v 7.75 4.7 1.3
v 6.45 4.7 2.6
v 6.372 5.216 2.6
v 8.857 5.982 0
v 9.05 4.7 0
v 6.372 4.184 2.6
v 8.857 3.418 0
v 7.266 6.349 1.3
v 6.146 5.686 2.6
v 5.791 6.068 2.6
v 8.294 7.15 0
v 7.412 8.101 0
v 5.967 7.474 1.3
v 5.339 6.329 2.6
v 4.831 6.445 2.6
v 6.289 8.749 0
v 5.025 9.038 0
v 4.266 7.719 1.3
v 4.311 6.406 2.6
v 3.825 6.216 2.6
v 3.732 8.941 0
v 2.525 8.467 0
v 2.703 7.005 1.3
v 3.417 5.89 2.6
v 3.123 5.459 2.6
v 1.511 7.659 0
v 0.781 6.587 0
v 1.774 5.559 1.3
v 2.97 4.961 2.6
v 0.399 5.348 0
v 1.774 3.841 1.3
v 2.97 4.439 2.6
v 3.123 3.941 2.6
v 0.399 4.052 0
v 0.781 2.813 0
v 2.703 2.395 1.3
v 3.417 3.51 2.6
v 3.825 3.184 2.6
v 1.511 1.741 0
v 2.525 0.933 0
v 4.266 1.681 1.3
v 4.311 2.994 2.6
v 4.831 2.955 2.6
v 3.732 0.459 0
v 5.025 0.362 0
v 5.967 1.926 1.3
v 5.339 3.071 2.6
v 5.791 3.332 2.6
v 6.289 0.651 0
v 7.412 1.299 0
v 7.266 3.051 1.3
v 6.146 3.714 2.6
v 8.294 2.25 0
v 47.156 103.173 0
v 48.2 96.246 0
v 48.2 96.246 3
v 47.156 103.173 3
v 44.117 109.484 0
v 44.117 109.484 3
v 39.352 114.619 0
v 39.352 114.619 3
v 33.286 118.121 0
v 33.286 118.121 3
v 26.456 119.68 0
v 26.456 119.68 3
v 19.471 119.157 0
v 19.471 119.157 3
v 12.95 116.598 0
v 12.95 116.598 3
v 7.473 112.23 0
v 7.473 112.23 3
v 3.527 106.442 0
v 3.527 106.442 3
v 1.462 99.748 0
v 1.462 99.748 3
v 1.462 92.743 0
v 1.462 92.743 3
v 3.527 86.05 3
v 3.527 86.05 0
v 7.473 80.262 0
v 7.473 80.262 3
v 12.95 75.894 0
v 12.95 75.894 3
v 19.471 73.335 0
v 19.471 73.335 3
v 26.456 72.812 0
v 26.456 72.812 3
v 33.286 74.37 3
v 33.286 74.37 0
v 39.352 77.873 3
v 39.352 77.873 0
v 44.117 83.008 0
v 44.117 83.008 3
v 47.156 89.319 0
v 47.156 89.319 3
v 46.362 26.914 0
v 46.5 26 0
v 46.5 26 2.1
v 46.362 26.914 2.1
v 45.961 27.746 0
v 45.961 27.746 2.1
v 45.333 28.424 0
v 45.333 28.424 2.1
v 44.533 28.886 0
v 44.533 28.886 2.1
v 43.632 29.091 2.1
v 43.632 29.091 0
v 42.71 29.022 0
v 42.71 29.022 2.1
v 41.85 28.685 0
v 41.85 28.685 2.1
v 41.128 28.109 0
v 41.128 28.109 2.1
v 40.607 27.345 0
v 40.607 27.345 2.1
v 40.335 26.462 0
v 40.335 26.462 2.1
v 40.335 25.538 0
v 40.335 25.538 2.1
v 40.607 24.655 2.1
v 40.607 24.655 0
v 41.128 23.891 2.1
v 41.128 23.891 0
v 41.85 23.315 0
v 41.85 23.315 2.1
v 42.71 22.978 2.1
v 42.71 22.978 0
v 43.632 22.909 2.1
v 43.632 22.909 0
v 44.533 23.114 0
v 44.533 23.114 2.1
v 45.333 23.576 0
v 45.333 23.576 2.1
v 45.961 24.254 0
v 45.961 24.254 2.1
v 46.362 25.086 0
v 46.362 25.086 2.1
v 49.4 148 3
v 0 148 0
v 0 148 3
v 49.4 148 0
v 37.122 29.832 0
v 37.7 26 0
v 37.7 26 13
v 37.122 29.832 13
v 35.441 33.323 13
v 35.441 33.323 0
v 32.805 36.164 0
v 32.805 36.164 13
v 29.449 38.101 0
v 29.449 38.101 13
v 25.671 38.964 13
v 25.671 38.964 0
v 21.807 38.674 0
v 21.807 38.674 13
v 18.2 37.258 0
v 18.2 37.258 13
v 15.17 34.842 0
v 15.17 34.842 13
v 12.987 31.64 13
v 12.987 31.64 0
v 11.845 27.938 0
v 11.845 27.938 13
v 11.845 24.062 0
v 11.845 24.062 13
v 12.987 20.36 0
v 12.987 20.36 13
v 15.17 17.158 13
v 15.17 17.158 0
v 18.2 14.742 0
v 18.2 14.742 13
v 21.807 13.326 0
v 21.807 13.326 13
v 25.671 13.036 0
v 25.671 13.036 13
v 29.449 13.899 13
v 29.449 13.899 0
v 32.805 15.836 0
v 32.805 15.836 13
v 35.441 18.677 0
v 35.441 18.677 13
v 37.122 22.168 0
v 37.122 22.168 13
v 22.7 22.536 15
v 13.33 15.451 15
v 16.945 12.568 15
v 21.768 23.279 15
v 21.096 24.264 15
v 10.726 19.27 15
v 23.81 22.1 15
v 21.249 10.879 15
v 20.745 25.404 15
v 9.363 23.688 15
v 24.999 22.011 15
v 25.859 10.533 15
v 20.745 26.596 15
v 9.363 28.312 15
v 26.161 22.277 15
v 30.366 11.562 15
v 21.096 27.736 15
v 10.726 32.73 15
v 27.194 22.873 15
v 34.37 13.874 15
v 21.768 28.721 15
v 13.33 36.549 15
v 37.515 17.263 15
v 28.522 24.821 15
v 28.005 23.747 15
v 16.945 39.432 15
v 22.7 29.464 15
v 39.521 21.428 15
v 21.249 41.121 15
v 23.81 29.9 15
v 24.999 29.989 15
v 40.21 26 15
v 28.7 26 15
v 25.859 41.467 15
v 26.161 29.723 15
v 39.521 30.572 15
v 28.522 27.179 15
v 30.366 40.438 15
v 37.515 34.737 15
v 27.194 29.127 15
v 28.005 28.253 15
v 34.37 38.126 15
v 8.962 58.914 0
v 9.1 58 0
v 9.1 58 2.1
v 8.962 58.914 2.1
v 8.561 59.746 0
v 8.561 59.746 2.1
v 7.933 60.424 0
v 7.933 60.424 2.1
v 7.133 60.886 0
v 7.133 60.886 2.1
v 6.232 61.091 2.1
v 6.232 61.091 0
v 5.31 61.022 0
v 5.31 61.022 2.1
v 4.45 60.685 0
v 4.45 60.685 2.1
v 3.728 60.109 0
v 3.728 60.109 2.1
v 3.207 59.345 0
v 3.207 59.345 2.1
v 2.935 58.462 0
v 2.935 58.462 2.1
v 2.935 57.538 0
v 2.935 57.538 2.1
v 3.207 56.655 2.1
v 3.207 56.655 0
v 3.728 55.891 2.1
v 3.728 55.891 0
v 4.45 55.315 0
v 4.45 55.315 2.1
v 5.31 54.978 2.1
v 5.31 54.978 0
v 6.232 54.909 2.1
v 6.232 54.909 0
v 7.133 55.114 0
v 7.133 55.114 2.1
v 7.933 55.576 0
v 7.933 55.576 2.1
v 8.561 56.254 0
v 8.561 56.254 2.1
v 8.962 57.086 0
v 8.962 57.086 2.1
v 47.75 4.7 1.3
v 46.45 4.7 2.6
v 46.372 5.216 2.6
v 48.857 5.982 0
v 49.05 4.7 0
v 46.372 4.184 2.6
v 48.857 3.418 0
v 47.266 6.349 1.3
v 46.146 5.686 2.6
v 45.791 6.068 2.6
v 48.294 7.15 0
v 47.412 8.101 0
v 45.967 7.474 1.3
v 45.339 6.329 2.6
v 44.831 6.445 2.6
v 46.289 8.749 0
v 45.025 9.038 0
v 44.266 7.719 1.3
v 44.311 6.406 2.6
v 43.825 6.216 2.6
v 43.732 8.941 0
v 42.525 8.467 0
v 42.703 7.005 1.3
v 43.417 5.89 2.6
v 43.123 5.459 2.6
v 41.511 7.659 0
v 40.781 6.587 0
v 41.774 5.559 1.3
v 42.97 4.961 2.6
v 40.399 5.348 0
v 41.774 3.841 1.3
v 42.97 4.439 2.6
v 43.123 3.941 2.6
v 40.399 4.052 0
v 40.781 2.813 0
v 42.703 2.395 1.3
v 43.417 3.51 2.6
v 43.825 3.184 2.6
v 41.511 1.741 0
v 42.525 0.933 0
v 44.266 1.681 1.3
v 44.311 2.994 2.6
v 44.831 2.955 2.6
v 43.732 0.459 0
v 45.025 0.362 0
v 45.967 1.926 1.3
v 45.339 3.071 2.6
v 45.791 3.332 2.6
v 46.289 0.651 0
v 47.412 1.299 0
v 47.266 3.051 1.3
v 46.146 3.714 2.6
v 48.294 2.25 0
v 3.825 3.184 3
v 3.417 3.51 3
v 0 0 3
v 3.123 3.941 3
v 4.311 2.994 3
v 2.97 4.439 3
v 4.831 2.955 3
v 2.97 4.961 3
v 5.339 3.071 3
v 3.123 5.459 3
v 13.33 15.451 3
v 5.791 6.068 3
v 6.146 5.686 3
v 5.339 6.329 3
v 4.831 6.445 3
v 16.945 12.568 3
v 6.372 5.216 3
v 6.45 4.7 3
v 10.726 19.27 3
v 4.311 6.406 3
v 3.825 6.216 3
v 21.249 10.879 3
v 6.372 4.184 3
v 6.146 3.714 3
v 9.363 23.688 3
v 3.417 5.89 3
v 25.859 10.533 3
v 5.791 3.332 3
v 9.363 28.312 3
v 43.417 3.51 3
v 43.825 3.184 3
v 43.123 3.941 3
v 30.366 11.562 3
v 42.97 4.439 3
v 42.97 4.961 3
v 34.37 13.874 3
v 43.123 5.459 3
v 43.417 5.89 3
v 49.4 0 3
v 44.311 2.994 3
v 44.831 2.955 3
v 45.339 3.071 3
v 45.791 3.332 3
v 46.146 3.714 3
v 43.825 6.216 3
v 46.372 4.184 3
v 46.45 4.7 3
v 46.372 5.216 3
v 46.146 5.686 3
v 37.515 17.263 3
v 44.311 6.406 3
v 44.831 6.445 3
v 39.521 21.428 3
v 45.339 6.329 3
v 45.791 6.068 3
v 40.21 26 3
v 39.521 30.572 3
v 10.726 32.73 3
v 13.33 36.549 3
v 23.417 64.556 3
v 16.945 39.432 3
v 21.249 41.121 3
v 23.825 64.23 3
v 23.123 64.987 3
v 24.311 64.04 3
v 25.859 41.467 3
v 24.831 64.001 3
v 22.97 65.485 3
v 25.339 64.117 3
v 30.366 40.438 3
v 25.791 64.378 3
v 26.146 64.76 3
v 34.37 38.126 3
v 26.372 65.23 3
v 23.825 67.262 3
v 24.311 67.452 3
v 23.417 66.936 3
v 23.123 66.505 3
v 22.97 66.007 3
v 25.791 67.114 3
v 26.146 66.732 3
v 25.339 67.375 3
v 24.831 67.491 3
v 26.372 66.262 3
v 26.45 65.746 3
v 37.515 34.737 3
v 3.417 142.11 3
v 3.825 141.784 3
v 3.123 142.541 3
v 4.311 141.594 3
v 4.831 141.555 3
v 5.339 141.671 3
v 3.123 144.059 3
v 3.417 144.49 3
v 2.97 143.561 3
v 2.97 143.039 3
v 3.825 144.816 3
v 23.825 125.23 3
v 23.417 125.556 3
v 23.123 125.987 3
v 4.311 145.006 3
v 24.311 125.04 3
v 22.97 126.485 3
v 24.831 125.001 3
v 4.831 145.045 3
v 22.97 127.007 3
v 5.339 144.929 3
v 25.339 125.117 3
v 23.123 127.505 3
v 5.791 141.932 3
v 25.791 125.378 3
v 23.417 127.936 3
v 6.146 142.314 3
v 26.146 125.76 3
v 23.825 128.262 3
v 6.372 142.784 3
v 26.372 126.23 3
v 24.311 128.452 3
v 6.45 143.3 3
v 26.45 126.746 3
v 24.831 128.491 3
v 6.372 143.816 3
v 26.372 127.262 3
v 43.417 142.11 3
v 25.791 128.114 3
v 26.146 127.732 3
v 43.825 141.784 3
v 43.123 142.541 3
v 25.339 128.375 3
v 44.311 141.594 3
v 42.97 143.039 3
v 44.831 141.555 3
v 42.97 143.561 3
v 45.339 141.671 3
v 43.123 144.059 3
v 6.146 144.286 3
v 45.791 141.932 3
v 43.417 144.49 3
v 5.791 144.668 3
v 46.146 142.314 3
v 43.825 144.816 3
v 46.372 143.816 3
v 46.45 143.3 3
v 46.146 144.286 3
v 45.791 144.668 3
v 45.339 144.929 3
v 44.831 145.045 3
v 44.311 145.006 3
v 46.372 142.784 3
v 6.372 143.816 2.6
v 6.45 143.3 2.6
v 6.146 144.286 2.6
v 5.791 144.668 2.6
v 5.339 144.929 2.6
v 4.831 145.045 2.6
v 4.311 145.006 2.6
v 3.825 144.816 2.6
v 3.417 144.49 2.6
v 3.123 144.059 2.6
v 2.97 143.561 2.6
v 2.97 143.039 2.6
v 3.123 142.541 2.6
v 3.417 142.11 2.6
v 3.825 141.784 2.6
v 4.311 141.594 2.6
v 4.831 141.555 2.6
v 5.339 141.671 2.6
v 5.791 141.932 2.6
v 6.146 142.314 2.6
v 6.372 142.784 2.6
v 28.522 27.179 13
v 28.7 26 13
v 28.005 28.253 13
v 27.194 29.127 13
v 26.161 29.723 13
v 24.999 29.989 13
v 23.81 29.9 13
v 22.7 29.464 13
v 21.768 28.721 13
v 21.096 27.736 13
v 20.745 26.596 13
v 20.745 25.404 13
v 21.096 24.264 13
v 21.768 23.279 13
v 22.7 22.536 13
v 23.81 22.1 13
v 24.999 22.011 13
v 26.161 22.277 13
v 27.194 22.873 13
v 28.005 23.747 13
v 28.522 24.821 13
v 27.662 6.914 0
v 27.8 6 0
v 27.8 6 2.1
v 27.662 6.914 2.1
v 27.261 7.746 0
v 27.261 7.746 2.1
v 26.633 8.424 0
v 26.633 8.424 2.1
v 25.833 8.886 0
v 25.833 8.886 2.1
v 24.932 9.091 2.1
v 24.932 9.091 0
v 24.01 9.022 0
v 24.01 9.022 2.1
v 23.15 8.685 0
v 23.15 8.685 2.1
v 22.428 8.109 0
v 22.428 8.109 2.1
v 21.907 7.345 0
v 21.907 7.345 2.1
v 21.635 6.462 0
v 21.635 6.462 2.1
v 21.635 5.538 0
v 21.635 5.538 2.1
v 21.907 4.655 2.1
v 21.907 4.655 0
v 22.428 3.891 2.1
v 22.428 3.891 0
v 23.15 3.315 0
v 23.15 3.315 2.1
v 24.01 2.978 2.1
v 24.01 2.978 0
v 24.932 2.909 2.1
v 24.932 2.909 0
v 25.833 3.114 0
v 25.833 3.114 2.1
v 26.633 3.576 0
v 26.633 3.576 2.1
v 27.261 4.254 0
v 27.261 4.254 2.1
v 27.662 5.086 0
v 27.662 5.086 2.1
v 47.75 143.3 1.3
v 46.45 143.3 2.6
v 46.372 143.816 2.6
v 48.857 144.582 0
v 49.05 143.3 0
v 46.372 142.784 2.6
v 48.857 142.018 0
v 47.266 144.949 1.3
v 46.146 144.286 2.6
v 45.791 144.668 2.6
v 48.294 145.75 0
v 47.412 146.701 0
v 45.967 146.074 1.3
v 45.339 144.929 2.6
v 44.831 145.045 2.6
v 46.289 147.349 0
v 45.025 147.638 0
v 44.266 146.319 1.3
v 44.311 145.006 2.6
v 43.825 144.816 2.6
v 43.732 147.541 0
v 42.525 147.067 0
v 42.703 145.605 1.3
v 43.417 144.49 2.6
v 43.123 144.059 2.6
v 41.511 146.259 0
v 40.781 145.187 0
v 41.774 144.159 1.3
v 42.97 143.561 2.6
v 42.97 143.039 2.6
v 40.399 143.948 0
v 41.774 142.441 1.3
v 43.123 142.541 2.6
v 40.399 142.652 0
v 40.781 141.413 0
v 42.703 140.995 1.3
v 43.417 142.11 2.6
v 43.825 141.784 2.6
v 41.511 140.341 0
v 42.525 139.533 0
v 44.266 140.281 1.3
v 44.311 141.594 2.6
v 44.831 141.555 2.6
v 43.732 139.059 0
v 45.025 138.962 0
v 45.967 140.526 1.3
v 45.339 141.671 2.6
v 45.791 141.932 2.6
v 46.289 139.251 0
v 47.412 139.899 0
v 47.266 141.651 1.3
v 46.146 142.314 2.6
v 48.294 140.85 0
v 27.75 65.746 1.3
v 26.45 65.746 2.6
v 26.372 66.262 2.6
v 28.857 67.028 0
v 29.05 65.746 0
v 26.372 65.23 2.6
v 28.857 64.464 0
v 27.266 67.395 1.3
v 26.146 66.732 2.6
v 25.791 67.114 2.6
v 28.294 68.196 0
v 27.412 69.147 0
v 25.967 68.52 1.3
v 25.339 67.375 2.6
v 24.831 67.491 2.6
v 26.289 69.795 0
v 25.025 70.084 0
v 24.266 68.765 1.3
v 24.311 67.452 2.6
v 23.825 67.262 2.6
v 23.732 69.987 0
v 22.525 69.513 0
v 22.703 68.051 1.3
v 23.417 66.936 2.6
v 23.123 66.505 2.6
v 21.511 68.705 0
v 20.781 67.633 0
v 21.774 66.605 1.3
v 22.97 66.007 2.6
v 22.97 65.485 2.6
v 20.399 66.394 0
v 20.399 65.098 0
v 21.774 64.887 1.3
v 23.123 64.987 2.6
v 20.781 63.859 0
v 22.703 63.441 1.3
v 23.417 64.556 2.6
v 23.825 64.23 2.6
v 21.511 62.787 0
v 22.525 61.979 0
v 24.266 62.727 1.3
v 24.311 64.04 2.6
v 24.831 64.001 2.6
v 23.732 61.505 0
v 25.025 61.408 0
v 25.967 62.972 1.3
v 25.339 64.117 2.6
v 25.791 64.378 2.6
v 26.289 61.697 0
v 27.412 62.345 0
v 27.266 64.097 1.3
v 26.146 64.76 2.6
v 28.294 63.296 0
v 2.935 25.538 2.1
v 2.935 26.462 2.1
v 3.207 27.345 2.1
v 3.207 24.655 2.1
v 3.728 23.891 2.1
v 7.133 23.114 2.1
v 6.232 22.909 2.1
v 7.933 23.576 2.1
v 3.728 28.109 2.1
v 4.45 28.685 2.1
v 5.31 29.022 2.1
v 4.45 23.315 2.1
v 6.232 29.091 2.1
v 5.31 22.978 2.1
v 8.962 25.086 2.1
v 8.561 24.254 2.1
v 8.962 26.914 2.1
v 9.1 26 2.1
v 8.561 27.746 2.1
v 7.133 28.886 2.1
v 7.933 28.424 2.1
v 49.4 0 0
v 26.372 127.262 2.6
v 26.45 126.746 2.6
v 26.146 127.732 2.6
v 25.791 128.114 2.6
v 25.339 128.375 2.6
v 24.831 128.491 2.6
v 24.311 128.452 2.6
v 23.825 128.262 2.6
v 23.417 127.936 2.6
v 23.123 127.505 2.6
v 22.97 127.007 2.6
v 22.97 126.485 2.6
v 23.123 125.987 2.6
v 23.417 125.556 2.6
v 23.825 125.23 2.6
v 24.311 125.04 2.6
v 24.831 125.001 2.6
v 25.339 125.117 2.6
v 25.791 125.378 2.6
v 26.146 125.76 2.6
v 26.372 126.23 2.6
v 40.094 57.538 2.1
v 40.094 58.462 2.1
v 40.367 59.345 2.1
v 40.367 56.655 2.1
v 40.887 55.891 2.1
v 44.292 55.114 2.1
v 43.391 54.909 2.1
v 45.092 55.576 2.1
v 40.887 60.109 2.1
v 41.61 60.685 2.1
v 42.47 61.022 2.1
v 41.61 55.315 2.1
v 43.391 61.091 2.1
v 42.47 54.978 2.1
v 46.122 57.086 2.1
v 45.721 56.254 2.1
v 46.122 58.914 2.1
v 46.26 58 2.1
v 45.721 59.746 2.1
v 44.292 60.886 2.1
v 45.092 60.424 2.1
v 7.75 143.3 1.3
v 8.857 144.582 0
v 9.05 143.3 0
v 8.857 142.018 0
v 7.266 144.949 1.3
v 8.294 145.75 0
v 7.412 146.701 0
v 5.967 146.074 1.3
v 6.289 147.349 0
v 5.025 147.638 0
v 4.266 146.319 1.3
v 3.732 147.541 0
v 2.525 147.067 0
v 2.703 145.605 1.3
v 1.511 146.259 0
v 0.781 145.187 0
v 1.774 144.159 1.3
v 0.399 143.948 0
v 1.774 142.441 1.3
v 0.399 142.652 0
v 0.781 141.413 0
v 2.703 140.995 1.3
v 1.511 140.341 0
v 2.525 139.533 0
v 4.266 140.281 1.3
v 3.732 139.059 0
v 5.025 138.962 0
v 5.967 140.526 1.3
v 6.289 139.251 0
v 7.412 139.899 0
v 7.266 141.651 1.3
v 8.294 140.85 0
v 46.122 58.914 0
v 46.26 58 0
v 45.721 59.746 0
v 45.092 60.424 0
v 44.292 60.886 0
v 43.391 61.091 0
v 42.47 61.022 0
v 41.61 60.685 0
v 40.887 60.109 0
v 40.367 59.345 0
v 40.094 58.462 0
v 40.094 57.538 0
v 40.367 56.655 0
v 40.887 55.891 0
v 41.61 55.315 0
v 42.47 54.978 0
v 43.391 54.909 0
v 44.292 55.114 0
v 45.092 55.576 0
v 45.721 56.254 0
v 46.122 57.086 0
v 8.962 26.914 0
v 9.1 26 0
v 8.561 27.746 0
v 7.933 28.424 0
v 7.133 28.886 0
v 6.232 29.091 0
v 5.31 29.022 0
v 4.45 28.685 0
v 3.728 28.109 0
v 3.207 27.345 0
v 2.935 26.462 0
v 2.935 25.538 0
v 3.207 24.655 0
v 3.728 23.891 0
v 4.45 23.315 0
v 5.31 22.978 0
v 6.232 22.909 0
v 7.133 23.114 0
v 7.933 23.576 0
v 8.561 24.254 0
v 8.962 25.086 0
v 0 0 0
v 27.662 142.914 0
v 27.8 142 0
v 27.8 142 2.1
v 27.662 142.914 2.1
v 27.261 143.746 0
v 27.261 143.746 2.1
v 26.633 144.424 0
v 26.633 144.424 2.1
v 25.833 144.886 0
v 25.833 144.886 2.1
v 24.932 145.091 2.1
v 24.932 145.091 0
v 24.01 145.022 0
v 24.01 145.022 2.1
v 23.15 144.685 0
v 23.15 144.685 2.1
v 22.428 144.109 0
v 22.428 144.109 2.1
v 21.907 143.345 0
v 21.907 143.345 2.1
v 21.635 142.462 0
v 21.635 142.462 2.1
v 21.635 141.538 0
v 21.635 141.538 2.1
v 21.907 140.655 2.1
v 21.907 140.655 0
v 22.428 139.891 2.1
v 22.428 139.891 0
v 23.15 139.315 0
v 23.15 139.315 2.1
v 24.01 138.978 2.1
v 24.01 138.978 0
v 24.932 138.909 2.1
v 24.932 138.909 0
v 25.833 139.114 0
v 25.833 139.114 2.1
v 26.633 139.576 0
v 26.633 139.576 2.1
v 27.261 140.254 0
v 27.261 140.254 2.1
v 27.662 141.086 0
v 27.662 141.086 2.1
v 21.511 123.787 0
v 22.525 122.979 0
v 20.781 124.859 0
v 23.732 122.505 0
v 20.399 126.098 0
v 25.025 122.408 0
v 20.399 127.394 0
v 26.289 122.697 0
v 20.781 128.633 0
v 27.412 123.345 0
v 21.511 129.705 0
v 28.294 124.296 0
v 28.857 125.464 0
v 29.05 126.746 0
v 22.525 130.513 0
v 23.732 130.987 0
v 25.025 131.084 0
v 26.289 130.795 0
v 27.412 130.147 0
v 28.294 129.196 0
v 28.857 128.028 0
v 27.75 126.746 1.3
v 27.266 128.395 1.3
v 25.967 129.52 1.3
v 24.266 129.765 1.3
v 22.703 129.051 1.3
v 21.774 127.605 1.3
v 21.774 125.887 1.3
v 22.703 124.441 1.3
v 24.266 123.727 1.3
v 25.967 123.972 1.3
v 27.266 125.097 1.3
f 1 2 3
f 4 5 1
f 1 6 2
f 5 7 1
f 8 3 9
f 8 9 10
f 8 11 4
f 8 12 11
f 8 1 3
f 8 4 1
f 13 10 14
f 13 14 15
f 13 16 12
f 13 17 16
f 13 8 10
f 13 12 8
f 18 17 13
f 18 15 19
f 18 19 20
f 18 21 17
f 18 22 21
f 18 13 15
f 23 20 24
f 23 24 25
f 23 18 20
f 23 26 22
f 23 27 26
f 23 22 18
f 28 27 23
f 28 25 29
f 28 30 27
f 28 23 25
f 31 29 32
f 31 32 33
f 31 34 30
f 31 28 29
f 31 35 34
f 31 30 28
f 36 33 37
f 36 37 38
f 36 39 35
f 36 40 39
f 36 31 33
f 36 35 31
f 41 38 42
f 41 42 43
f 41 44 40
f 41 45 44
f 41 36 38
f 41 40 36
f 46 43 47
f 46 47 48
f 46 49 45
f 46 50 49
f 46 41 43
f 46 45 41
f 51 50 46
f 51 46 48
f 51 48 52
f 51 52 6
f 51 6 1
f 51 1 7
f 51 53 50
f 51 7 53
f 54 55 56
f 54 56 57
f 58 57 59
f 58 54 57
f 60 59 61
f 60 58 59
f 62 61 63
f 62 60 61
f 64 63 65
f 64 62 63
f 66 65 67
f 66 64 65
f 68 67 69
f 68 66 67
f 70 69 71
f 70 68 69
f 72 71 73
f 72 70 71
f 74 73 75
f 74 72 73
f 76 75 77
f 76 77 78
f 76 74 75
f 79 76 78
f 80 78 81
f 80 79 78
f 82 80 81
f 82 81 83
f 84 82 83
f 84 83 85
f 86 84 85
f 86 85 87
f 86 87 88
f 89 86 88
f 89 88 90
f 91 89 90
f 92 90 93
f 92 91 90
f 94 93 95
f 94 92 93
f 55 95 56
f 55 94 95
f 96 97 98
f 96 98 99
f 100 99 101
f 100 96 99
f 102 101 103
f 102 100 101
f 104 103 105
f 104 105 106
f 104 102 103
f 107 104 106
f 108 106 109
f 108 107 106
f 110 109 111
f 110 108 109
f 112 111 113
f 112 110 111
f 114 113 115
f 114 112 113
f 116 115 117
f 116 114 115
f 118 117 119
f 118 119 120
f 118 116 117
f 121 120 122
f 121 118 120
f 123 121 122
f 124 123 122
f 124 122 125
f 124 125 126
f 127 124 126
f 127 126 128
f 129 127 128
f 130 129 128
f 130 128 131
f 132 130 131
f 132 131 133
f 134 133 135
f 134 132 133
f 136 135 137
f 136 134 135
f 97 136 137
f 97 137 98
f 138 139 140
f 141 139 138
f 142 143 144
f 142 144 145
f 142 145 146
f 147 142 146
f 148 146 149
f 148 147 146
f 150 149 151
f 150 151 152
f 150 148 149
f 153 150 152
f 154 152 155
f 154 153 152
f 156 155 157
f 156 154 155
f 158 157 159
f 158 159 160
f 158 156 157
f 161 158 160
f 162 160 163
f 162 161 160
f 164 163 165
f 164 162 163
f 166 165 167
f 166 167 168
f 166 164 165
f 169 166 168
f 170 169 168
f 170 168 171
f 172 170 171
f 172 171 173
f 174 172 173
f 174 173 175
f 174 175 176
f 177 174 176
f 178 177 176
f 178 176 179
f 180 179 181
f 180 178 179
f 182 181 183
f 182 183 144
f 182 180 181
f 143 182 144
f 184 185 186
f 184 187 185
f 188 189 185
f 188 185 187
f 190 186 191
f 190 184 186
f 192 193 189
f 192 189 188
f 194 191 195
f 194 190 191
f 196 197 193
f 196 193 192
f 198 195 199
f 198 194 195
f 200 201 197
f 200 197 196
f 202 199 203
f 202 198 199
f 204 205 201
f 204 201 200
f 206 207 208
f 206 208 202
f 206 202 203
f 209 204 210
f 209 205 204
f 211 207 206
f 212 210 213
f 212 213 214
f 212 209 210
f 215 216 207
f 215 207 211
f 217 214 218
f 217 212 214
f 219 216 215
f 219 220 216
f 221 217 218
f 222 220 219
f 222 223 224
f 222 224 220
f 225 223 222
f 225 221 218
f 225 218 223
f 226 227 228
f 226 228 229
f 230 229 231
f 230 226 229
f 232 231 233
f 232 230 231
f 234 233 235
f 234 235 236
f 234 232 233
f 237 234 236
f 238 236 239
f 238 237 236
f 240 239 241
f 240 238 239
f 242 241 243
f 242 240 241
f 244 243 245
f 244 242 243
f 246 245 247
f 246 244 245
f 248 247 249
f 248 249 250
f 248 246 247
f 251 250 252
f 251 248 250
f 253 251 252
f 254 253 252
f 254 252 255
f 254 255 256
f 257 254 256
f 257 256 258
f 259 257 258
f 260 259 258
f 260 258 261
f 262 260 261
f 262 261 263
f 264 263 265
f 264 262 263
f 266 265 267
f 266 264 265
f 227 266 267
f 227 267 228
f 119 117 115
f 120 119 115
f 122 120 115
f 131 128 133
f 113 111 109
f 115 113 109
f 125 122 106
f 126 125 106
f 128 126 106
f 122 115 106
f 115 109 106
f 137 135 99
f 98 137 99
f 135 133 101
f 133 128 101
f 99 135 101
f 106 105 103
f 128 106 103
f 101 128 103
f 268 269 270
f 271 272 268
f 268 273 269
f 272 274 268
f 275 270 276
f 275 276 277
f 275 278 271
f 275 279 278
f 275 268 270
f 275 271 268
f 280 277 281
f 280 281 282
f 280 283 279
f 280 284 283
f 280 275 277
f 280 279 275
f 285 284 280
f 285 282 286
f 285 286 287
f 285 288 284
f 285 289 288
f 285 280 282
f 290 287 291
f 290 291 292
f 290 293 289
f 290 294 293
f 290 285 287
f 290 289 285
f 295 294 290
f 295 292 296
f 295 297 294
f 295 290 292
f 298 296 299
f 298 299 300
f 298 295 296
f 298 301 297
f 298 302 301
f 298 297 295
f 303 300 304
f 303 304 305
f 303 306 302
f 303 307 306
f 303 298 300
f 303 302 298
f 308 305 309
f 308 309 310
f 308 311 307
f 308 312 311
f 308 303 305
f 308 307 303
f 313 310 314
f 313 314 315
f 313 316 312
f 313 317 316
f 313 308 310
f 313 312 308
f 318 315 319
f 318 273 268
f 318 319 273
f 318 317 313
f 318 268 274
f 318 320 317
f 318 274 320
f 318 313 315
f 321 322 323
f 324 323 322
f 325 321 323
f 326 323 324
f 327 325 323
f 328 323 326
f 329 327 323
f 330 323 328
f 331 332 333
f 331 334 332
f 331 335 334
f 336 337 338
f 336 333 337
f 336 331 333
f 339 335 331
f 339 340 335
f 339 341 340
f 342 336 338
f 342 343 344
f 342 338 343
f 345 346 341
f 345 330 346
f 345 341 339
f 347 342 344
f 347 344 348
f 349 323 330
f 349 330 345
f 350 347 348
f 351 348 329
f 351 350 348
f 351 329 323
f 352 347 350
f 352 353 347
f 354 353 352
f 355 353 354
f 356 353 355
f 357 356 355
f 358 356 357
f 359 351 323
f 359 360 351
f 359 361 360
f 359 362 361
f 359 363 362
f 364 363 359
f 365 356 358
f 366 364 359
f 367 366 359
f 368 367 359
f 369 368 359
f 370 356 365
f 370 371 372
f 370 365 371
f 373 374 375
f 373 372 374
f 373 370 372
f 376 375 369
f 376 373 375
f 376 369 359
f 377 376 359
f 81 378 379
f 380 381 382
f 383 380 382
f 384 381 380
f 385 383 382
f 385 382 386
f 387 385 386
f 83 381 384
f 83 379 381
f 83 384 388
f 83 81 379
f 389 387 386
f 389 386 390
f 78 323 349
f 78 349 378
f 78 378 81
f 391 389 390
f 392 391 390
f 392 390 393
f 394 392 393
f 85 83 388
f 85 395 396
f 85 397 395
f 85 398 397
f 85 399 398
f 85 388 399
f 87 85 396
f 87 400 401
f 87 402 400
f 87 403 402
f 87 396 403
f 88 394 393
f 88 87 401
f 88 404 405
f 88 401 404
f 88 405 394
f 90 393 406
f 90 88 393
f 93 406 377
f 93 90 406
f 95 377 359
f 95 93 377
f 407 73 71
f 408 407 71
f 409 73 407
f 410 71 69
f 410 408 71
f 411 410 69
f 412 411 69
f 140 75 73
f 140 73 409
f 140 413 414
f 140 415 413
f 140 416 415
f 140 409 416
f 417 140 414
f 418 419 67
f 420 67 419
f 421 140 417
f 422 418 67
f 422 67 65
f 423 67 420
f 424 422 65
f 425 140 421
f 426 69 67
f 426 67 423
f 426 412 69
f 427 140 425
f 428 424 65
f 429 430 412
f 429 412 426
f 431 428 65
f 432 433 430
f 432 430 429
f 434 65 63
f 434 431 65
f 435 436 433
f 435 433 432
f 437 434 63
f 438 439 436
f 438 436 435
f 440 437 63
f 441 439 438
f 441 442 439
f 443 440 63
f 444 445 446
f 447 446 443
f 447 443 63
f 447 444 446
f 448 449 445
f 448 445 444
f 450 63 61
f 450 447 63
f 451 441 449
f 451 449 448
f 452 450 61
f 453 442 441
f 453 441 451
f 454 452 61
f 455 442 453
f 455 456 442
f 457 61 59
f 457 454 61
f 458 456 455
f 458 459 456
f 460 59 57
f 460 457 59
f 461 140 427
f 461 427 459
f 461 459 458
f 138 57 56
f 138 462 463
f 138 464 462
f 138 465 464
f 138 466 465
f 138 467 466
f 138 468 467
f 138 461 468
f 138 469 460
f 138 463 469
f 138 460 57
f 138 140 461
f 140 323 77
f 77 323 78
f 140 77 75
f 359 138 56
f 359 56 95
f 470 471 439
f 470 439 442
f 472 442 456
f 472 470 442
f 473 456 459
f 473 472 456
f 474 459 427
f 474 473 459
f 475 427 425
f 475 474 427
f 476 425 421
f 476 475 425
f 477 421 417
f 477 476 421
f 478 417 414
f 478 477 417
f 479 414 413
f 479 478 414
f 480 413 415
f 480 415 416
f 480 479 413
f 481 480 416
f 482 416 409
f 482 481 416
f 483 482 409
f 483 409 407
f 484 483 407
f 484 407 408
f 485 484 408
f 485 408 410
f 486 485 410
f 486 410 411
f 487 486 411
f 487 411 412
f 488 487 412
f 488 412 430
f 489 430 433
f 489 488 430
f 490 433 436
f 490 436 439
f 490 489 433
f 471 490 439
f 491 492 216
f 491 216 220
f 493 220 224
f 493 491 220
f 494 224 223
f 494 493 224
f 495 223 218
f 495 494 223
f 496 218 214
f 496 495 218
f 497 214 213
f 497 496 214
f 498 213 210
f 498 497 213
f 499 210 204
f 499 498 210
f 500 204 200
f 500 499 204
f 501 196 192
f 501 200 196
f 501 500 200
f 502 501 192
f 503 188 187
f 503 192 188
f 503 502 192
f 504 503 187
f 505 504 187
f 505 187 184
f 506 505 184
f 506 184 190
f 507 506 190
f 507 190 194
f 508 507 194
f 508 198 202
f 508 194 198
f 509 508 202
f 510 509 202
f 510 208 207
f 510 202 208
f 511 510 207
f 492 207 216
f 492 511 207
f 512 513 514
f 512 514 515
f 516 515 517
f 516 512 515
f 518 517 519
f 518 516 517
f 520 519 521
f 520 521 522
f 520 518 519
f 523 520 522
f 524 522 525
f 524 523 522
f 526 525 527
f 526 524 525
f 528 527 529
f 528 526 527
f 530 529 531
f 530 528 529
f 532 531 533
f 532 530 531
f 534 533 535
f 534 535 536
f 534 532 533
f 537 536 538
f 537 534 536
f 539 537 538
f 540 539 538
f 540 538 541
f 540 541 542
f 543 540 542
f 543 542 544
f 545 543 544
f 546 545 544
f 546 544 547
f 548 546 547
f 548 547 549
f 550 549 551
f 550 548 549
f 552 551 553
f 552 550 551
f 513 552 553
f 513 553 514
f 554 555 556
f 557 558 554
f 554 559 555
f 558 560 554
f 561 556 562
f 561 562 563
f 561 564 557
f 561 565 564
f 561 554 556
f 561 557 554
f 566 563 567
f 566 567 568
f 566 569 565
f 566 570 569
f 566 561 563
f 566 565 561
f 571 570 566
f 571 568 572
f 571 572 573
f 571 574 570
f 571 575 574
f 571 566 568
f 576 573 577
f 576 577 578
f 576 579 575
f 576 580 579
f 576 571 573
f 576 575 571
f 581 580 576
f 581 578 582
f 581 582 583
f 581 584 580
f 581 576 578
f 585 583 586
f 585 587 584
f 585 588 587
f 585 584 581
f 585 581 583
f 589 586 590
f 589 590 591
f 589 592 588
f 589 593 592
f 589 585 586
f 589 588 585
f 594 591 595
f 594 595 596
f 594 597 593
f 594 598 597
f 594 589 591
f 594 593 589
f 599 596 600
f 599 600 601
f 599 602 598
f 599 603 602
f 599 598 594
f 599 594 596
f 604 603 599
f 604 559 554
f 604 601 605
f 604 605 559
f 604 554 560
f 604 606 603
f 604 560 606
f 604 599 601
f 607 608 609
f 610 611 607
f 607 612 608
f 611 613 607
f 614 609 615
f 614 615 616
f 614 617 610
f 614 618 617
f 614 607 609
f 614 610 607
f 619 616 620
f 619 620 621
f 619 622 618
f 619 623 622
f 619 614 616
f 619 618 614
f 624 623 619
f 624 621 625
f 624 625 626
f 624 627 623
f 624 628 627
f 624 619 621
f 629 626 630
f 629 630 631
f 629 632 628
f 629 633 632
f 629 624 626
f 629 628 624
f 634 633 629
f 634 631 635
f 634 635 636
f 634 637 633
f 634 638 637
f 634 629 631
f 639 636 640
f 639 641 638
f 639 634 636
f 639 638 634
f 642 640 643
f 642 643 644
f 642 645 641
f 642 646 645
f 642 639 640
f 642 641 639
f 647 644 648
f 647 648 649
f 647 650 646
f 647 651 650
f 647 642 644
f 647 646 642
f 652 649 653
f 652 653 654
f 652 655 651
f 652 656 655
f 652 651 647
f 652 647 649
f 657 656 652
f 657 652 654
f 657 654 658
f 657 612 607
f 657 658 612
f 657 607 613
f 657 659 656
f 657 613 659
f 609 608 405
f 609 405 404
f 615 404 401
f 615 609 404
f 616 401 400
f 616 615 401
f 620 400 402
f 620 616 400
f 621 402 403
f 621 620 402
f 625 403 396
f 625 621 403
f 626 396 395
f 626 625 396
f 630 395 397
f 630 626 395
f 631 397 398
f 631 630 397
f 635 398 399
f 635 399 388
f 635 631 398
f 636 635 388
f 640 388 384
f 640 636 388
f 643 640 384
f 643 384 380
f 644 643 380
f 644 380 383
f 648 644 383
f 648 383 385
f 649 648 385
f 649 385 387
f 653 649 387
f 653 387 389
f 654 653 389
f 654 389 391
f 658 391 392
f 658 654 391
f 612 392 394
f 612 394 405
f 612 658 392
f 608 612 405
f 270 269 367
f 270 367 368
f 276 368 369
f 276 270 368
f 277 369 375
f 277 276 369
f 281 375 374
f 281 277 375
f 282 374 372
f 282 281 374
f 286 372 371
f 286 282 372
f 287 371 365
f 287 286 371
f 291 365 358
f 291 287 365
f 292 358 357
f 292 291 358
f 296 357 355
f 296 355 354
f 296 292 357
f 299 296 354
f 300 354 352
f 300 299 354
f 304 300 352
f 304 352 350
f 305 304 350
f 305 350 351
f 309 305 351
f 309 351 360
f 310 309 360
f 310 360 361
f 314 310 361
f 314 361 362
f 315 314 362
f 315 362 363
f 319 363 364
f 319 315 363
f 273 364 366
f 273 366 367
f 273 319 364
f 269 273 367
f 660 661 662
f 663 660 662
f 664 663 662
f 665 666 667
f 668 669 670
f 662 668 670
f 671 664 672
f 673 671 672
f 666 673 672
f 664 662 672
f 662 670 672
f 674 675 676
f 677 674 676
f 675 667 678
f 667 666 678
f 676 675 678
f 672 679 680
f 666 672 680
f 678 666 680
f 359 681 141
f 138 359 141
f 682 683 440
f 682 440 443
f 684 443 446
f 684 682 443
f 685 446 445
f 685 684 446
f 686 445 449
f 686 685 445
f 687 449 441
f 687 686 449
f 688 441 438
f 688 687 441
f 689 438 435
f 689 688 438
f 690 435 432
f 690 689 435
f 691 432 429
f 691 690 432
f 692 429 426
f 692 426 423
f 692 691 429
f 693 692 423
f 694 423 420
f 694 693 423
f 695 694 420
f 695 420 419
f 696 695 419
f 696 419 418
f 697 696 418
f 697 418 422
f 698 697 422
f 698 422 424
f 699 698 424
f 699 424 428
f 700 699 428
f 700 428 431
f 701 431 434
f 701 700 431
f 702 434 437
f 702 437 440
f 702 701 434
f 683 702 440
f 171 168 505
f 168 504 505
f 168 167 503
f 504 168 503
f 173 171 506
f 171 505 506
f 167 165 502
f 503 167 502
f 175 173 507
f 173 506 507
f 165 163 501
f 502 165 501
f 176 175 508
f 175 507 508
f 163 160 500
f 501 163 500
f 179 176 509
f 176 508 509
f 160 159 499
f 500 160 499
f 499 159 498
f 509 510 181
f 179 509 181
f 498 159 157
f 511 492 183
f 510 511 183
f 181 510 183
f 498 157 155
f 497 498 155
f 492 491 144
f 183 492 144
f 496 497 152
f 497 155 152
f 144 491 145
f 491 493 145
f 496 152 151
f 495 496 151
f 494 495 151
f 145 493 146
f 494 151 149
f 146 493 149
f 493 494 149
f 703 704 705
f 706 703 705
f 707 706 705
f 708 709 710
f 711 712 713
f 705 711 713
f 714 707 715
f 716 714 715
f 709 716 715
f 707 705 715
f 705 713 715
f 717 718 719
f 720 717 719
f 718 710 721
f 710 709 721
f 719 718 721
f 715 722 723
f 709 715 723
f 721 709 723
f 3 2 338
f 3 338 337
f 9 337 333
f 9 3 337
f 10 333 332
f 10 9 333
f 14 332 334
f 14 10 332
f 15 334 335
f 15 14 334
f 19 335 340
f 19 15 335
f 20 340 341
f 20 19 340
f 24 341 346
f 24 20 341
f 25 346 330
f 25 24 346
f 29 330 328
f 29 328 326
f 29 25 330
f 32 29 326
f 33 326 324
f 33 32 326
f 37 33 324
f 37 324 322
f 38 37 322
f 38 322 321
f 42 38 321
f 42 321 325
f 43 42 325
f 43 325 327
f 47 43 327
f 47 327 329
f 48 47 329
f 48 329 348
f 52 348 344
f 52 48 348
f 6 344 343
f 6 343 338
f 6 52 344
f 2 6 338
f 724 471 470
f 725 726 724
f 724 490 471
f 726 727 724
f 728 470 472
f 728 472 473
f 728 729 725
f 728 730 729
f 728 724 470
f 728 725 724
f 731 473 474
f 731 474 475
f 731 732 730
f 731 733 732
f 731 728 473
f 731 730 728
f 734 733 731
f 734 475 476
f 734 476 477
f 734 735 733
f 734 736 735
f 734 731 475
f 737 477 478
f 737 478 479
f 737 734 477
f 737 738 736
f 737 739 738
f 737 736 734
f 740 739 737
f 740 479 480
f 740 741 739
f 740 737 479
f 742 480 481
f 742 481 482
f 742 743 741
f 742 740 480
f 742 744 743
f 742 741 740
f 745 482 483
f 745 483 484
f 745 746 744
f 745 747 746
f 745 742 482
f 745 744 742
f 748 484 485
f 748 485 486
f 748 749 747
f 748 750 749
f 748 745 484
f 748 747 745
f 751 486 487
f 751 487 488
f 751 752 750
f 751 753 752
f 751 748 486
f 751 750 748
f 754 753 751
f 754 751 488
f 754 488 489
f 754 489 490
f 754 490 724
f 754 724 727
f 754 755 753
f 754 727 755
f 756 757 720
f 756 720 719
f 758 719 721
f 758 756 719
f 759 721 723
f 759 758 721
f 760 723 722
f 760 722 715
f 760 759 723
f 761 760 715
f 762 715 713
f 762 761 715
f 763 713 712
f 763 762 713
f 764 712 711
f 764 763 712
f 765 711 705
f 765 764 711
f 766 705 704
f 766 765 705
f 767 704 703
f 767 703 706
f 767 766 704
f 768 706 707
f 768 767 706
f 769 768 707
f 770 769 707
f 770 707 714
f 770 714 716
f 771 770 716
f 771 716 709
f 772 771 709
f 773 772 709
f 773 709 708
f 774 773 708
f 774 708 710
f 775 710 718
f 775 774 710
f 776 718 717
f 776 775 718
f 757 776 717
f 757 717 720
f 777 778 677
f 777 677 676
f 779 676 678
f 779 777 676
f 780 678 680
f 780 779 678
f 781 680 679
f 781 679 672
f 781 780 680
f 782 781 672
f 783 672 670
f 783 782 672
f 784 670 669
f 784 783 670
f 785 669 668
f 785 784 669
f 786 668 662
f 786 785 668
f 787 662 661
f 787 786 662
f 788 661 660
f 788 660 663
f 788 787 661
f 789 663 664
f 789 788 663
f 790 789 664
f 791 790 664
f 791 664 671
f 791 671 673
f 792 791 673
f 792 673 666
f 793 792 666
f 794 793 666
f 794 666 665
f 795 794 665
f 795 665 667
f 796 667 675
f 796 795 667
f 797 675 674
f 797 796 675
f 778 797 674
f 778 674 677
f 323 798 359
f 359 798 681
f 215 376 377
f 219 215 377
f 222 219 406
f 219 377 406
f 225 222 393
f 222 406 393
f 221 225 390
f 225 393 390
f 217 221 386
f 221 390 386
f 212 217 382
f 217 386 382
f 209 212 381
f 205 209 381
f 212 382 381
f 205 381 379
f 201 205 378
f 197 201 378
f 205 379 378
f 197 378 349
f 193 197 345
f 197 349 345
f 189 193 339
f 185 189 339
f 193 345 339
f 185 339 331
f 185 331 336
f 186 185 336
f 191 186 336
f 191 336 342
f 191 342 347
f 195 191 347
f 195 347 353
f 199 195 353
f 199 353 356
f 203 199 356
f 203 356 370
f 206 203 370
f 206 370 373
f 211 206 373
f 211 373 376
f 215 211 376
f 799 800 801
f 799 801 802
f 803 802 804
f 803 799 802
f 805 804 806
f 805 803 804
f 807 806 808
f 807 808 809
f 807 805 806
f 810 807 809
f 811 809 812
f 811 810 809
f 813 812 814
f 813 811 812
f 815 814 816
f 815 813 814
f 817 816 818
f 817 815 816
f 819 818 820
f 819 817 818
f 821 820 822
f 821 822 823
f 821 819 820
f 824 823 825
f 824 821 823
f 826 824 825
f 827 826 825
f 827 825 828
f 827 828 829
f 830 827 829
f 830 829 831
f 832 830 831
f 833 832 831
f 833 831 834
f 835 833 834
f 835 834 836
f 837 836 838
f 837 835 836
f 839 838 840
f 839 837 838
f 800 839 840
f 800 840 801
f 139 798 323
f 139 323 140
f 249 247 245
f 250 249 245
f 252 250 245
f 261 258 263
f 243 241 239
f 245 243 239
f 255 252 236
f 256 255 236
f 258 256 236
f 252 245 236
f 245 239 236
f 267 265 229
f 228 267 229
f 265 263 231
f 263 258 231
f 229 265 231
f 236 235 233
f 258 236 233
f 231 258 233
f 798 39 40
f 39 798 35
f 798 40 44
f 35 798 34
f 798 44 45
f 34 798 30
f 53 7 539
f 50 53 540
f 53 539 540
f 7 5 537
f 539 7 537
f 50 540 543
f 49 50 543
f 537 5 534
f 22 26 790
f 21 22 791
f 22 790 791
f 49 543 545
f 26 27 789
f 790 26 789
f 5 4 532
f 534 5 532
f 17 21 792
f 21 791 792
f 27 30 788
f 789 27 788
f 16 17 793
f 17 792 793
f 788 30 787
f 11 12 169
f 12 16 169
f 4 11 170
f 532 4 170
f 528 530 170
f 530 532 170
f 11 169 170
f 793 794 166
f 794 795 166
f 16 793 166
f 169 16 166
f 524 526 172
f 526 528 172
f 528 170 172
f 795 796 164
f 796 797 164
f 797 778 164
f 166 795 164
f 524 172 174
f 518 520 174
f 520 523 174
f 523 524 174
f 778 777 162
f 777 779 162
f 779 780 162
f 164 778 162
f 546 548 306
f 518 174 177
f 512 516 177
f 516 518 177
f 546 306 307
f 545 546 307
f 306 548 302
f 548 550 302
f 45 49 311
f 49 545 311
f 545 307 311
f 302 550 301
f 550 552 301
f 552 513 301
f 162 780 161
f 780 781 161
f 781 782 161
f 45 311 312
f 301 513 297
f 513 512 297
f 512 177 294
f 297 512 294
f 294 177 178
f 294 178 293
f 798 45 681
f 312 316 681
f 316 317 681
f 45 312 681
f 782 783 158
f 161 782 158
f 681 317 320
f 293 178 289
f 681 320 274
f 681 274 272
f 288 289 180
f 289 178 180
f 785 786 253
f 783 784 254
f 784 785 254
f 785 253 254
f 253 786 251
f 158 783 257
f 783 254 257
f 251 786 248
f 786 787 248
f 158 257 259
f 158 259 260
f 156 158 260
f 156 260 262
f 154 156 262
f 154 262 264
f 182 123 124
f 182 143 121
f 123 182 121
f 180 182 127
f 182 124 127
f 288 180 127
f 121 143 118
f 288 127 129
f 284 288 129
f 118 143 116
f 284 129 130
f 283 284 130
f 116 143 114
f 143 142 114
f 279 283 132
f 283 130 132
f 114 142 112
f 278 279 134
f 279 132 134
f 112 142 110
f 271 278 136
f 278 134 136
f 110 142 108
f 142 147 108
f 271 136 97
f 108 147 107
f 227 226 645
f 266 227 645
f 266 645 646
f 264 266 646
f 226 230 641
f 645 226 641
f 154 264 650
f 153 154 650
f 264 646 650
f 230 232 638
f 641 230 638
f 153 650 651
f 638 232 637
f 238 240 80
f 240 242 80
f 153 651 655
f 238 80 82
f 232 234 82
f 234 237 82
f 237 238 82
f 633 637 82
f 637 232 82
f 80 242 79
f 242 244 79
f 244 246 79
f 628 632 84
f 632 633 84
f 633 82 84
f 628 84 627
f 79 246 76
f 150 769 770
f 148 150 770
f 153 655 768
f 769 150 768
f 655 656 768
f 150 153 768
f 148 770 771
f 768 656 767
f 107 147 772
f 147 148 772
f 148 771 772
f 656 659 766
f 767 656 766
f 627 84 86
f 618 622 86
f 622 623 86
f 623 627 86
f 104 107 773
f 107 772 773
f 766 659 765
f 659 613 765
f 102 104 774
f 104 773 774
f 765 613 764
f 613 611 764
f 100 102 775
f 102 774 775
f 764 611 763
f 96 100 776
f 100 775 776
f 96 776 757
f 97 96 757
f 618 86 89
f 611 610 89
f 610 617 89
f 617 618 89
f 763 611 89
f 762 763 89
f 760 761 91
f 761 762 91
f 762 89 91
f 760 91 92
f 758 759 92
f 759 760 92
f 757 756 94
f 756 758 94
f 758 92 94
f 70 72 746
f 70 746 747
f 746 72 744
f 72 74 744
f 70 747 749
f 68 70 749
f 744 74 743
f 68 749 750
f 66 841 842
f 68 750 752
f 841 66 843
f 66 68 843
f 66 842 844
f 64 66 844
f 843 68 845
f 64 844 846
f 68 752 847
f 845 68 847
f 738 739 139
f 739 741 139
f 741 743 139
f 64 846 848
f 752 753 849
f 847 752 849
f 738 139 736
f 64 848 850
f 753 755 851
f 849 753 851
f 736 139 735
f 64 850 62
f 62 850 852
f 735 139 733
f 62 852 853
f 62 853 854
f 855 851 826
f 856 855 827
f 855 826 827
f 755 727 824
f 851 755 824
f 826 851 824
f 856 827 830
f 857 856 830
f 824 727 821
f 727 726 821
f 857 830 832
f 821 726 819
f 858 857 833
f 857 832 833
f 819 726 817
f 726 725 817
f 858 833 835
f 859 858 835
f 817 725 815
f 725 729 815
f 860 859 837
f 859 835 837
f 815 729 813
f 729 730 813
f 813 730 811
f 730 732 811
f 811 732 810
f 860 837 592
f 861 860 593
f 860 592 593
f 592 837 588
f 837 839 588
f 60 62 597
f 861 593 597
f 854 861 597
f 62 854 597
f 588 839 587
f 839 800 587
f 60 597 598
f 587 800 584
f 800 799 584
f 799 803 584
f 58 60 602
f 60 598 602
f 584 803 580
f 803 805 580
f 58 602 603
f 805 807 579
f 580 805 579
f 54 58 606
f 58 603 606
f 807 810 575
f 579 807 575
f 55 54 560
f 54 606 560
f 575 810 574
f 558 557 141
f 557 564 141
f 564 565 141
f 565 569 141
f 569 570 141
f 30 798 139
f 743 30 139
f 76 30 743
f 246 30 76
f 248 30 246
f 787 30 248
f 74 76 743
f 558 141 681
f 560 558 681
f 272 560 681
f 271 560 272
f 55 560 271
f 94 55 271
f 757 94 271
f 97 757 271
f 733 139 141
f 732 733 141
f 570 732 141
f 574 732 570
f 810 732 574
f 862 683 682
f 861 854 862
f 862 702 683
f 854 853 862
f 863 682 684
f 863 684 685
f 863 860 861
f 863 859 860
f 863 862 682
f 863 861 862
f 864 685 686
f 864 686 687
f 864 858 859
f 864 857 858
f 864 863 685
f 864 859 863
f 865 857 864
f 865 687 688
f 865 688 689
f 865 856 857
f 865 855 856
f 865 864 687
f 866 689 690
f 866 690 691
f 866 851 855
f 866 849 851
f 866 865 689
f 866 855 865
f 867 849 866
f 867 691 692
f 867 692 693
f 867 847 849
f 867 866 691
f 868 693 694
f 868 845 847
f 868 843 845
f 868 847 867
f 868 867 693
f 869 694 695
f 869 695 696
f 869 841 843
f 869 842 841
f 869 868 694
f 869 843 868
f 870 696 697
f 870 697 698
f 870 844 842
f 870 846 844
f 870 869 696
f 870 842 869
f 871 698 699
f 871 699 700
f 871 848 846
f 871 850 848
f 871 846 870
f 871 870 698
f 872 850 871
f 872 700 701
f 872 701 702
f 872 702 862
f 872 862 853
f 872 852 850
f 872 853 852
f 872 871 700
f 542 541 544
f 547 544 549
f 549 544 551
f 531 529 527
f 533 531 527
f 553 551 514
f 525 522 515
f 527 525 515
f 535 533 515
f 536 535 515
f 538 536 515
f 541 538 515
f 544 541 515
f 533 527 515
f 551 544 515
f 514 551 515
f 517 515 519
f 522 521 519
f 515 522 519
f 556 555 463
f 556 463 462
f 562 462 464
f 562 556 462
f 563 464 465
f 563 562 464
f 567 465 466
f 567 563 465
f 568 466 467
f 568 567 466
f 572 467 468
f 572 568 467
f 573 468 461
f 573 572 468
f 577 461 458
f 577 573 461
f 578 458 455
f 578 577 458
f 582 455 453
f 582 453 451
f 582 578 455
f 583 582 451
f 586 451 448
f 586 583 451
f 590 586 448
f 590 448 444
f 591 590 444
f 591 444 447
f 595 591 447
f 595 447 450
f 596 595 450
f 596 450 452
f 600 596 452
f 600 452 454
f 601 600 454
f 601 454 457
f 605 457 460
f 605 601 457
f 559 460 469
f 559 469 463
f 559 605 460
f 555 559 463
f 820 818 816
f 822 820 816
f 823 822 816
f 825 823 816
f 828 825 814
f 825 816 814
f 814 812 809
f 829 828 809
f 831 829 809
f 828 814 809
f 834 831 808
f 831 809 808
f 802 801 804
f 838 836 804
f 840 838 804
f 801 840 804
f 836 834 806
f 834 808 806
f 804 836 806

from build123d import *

# Parameters (mm, degrees)
SKETCH_W        = 49.4
SKETCH_H        = 148
SKETCH_R        = 1.75
SKETCH_R_2      = 23.5
SKETCH_R_3      = 13
PAD_DEPTH       = 3
CHAMFER_SIZE    = 2.6
SKETCH001_R     = 3.1
POCKET_DEPTH    = 2.1
SKETCH002_R     = 15.51
PAD001_DEPTH    = 15
SKETCH003_R     = 13
POCKET001_DEPTH = 13
SKETCH004_R     = 4
POCKET002_DEPTH = 15.001


with BuildPart() as part:
    # Sketch → Pad (new body)
    with BuildSketch(Plane.XY):
        with Locations((24.7, 74)):
            Rectangle(SKETCH_W, SKETCH_H)
        with Locations((24.7, 126.745966)):
            Circle(SKETCH_R, mode=Mode.SUBTRACT)
        with Locations((24.7, 65.745966)):
            Circle(SKETCH_R, mode=Mode.SUBTRACT)
        with Locations((24.7, 96.245966)):
            Circle(SKETCH_R_2, mode=Mode.SUBTRACT)
        with Locations((4.7, 143.3)):
            Circle(SKETCH_R, mode=Mode.SUBTRACT)
        with Locations((44.7, 143.3)):
            Circle(SKETCH_R, mode=Mode.SUBTRACT)
        with Locations((4.7, 4.7)):
            Circle(SKETCH_R, mode=Mode.SUBTRACT)
        with Locations((44.7, 4.7)):
            Circle(SKETCH_R, mode=Mode.SUBTRACT)
        with Locations((24.7, 26)):
            Circle(SKETCH_R_3, mode=Mode.SUBTRACT)
    extrude(amount=PAD_DEPTH)

    # Chamfer
    chamfer_edges = [part.edges().sort_by_distance(p)[0] for p in [
        (2.95, 4.7, 0),
        (42.95, 4.7, 0),
        (22.95, 65.745966, 0),
        (22.95, 126.745966, 0),
        (2.95, 143.3, 0),
        (42.95, 143.3, 0),
    ]]
    chamfer(chamfer_edges, length=CHAMFER_SIZE)

    # Sketch001 → Pocket (cut)
    with BuildSketch(Plane.XY):
        with Locations((24.7, 142)):
            Circle(SKETCH001_R)
        with Locations((24.7, 6)):
            Circle(SKETCH001_R)
        with Locations((43.4, 26)):
            Circle(SKETCH001_R)
        with Locations((6, 26)):
            Circle(SKETCH001_R)
        with Locations((6, 58)):
            Circle(SKETCH001_R)
        with Locations((43.159603, 58)):
            Circle(SKETCH001_R)
    extrude(amount=POCKET_DEPTH, mode=Mode.SUBTRACT)

    # Sketch002 → Pad001 (join)
    with BuildSketch(Plane.XY):
        with Locations((24.7, 26)):
            Circle(SKETCH002_R)
    extrude(amount=PAD001_DEPTH)

    # Sketch003 → Pocket001 (cut)
    with BuildSketch(Plane.XY):
        with Locations((24.7, 26)):
            Circle(SKETCH003_R)
    extrude(amount=POCKET001_DEPTH, mode=Mode.SUBTRACT)

    # Sketch004 → Pocket002 (cut, through all)
    with BuildSketch(Plane.XY):
        with Locations((24.7, 26)):
            Circle(SKETCH004_R)
    extrude(amount=POCKET002_DEPTH, mode=Mode.SUBTRACT)


solid = part.part
